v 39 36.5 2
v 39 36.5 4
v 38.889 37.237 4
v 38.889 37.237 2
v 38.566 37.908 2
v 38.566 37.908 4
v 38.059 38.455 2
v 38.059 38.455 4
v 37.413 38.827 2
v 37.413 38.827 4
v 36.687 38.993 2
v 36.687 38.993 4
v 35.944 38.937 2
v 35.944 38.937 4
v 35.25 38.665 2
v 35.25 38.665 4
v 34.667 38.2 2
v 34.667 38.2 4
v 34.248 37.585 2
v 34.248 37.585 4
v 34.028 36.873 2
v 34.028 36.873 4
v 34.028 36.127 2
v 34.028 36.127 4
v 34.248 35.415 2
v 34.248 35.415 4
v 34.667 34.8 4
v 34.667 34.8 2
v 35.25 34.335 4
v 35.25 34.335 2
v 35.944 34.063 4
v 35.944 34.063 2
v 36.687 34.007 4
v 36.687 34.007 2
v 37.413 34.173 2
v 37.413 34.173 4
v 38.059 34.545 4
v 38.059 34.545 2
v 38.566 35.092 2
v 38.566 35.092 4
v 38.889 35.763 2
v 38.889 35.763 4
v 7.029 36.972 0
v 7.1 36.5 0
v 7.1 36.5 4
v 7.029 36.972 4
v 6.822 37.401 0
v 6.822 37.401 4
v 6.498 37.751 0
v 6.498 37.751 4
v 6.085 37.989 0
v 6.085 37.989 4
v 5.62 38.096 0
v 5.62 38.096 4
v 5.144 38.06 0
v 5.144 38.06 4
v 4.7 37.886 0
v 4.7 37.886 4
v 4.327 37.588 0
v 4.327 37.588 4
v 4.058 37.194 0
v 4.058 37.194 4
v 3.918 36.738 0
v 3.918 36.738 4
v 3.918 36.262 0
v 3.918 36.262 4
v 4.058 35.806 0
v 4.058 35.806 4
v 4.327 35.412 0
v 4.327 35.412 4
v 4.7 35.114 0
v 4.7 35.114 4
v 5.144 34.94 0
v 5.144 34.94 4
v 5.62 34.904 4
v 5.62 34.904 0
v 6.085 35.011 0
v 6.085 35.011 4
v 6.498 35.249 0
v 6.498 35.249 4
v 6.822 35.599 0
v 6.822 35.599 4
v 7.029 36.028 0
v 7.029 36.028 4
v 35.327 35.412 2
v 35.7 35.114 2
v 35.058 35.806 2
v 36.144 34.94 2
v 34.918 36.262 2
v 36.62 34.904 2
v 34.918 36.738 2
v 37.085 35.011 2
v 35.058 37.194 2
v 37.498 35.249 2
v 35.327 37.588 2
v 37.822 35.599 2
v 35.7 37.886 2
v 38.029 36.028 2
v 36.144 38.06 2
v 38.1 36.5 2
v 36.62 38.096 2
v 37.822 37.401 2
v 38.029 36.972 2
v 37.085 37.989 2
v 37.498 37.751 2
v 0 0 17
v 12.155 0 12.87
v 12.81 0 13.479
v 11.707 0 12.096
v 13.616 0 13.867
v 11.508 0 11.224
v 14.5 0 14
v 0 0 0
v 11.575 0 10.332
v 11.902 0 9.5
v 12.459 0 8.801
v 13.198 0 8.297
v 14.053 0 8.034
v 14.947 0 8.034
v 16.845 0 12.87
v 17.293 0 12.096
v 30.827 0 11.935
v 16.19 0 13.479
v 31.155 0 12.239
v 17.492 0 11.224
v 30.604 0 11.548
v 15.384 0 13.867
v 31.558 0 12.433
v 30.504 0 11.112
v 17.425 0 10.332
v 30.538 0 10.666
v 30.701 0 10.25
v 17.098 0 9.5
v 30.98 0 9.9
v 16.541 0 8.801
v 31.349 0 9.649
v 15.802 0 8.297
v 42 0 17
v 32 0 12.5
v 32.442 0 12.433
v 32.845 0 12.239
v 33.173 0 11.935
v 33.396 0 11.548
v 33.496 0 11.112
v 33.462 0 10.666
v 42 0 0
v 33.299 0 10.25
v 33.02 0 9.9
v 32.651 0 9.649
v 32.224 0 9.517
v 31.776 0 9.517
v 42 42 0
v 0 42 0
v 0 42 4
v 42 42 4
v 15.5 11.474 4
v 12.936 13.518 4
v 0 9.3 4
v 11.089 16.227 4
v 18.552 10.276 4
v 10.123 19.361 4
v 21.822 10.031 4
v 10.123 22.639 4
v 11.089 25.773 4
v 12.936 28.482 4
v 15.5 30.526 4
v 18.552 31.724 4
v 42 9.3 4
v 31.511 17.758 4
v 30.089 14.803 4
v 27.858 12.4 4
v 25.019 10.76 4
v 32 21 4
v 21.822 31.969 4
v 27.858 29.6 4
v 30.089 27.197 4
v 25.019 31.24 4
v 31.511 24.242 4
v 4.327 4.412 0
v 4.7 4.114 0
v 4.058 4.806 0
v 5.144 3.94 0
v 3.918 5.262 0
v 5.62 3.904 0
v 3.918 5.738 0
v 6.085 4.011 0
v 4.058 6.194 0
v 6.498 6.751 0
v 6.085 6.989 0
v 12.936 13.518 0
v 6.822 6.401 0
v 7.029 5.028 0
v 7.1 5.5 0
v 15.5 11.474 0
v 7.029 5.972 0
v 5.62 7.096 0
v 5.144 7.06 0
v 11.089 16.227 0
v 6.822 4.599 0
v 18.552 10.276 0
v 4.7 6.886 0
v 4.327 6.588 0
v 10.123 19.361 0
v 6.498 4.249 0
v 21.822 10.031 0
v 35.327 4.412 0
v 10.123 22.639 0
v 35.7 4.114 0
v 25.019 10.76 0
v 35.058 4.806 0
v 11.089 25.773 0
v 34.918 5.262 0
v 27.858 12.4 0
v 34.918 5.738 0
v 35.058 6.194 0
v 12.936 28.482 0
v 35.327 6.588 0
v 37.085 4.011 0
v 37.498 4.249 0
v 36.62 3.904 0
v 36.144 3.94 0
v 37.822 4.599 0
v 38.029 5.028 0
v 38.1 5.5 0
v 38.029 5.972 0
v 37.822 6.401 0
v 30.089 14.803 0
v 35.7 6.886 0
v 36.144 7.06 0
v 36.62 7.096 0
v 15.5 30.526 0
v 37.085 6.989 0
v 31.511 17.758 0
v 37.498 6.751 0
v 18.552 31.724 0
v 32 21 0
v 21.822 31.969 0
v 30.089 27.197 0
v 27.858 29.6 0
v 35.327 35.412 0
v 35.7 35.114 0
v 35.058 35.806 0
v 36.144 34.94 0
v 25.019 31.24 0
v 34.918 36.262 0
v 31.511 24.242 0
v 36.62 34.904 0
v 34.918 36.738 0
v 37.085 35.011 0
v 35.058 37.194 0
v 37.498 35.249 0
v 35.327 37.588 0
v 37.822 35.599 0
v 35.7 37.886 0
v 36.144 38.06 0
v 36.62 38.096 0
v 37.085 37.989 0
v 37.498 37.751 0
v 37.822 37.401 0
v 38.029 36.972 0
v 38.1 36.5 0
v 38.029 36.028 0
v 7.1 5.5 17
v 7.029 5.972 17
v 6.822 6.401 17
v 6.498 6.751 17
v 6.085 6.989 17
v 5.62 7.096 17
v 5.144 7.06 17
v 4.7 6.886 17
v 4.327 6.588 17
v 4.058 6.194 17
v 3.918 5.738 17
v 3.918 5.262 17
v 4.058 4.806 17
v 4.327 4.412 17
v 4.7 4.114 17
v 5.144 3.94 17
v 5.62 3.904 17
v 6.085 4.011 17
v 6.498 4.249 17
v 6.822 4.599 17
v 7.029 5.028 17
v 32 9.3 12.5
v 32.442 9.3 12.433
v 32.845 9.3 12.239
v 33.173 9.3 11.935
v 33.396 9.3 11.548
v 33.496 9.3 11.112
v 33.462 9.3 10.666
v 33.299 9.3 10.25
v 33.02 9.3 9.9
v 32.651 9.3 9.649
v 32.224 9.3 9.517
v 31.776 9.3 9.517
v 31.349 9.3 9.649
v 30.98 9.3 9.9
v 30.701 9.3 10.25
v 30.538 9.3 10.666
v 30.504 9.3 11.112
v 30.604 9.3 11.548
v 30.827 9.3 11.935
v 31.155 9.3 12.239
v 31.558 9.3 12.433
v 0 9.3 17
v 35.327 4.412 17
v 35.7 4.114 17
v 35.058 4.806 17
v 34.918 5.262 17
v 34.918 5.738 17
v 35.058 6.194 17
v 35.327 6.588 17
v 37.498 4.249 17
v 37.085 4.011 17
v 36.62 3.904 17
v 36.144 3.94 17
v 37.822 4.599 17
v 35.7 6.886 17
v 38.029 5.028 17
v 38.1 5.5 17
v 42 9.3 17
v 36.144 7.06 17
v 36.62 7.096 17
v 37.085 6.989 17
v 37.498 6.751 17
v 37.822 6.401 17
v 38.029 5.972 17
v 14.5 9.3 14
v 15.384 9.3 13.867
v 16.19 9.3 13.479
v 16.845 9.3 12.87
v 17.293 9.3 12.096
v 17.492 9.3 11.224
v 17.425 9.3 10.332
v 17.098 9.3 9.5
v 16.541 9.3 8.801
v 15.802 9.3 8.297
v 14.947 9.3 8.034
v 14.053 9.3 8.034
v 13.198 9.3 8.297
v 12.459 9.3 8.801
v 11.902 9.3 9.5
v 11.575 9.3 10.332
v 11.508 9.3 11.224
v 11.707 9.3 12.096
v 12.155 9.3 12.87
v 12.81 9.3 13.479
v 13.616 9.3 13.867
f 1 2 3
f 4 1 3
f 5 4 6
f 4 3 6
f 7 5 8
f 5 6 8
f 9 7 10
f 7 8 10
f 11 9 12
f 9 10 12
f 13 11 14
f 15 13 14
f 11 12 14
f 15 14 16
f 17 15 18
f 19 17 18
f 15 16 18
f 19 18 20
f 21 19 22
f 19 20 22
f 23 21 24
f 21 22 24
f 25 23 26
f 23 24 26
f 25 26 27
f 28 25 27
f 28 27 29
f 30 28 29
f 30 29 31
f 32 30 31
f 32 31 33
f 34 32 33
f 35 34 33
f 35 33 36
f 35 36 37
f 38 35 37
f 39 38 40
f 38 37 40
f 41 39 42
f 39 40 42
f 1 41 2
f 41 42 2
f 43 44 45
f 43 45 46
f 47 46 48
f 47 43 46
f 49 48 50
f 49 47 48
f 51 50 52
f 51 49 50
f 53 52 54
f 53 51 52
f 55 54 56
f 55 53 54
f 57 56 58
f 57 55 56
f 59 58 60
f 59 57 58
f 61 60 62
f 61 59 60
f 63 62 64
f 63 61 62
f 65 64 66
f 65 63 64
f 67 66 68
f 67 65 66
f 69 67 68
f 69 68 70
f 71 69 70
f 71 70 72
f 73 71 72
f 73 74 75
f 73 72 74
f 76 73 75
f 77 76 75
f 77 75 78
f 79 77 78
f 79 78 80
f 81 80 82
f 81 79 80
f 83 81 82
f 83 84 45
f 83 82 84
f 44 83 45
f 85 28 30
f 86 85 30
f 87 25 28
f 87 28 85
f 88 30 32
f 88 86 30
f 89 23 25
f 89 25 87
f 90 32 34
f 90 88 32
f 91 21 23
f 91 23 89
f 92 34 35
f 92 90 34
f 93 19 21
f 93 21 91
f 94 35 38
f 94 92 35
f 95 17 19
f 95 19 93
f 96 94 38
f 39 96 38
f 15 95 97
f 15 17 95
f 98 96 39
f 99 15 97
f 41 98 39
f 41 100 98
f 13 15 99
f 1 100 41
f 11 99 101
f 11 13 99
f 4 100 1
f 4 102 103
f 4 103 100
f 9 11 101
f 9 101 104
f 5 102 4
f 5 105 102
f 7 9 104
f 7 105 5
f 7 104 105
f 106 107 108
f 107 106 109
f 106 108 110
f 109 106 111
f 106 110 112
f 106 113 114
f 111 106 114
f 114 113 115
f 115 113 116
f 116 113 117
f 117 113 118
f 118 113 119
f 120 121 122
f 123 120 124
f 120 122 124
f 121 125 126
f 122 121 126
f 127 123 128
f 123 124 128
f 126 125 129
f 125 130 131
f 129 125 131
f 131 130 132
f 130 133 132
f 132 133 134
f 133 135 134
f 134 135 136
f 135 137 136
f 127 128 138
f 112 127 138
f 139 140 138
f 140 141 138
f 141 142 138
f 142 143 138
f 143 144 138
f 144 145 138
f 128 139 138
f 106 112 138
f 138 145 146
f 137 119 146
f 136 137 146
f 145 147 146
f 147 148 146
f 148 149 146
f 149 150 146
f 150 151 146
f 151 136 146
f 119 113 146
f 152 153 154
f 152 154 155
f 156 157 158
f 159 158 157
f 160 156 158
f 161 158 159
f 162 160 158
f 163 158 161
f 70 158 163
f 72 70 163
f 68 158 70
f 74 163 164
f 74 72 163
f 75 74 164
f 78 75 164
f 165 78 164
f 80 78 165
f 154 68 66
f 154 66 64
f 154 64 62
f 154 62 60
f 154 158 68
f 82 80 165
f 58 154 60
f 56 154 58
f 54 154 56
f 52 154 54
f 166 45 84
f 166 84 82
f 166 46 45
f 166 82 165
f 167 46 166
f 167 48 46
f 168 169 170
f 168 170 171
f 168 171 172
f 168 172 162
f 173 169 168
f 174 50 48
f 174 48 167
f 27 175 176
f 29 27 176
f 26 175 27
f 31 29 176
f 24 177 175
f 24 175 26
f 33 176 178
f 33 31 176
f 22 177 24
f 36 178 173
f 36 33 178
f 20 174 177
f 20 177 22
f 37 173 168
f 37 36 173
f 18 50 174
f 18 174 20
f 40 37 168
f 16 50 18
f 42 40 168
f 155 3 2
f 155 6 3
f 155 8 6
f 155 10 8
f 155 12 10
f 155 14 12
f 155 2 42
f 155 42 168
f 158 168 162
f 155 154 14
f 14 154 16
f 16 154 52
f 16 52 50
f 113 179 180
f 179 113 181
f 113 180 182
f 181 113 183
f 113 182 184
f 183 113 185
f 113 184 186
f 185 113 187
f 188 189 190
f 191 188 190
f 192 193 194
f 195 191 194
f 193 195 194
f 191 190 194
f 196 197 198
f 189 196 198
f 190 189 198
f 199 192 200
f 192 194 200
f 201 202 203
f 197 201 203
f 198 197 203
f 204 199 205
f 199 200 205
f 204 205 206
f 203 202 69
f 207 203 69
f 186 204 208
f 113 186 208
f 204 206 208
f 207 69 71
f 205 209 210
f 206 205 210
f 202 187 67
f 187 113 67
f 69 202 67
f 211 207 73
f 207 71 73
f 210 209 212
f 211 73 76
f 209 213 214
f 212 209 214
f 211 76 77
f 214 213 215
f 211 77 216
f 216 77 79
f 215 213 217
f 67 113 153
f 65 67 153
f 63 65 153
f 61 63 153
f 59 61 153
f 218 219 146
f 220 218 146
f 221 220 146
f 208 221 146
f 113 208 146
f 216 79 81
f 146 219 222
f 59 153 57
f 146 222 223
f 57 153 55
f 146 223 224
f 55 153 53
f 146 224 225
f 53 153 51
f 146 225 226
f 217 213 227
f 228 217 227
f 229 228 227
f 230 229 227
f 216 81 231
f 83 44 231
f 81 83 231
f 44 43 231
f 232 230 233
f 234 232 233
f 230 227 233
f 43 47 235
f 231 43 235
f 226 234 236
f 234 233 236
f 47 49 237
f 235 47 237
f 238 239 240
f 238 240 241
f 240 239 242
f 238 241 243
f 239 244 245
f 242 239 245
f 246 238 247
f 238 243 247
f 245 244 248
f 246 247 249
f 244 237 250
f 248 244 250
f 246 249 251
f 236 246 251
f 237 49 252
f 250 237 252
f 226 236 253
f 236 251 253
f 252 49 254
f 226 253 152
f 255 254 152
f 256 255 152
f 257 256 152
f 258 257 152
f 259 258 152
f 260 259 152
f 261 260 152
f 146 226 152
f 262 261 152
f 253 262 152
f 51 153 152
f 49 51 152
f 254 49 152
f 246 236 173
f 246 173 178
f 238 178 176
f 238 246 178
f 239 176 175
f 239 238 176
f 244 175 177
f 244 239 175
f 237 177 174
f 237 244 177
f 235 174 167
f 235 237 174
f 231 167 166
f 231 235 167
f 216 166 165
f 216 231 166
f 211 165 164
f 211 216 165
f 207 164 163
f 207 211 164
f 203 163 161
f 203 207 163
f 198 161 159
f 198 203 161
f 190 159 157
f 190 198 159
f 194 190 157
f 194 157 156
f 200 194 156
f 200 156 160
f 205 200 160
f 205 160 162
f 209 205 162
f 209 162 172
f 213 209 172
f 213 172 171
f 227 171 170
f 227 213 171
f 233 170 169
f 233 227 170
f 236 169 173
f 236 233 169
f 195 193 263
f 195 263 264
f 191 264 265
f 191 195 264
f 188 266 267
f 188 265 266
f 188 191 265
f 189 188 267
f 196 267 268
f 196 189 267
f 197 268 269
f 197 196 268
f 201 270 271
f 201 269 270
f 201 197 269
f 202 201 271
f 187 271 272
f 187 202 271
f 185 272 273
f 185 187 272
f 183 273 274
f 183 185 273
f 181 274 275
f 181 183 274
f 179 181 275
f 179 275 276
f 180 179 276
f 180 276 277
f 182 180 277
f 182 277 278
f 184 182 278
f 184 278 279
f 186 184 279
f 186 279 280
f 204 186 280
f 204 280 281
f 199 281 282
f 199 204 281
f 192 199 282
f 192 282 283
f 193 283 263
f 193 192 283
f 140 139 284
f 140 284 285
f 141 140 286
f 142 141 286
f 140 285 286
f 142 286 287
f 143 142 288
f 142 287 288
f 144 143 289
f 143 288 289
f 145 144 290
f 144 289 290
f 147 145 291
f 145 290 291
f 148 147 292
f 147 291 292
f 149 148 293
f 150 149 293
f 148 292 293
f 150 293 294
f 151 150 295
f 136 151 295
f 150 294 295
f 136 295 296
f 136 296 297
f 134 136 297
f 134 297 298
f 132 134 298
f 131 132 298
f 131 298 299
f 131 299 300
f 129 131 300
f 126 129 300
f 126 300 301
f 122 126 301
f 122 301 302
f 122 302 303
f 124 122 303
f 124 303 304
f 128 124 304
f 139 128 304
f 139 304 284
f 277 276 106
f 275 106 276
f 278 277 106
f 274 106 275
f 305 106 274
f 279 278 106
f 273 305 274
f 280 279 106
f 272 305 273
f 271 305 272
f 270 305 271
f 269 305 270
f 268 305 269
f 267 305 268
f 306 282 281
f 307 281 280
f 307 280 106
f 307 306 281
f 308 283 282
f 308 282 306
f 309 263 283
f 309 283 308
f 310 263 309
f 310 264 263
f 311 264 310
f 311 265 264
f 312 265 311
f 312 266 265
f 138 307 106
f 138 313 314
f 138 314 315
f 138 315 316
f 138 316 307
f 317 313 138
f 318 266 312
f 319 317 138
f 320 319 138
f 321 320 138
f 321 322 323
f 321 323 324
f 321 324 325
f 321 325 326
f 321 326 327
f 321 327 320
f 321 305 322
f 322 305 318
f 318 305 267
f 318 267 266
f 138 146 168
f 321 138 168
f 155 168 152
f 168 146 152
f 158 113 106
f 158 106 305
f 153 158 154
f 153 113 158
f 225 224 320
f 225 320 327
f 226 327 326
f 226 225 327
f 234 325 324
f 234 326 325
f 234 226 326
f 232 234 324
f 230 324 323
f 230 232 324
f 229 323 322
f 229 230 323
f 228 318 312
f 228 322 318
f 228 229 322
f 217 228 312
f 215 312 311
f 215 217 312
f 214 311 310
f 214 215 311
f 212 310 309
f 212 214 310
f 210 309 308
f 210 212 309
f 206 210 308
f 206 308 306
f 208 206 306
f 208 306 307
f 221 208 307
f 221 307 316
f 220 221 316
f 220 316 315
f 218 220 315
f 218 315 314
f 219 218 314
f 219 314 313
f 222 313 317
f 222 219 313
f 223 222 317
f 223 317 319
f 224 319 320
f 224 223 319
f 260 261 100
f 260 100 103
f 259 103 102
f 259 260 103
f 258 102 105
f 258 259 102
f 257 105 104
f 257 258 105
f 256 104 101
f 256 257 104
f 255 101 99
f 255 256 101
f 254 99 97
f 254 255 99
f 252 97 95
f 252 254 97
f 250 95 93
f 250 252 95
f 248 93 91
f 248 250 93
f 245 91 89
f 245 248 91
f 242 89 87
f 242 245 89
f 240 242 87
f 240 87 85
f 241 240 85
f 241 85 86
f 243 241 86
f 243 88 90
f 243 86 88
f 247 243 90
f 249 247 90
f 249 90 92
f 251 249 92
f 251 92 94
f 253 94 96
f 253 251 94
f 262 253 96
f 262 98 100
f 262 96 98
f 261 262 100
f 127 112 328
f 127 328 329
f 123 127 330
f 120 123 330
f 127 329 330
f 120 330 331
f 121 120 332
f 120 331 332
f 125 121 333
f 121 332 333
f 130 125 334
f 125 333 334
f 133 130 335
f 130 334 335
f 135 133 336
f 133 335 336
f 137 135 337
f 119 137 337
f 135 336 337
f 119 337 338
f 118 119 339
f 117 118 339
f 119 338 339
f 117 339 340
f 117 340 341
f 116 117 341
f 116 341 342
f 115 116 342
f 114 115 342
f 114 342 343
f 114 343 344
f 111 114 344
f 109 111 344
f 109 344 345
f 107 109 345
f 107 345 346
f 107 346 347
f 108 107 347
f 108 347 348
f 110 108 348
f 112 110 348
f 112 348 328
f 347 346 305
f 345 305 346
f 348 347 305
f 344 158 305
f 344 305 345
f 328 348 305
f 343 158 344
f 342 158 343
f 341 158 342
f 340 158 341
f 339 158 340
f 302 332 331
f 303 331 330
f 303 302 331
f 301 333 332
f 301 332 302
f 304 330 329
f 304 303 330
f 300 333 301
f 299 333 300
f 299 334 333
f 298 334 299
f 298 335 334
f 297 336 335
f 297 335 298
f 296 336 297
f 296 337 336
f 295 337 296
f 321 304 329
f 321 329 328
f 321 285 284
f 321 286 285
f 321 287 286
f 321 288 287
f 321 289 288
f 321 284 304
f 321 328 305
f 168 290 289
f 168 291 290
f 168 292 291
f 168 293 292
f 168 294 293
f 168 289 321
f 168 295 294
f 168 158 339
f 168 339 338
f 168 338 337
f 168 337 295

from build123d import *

# Parameters (mm, degrees)
SKETCH1_W               = 42
SKETCH1_H               = 42
BOSS_EXTRUDE1_DEPTH     = 17
SKETCH3_W               = 42
SKETCH3_H               = 13
CUT_EXTRUDE1_DEPTH      = 32.7
CUT_EXTRUDE2_DEPTH      = 61.802960454
CUT_EXTRUDE2_DEPTH_BACK = 61.802960454
SKETCH4_R               = 1.6
SKETCH4_R_2             = 11
SKETCH5_R               = 2.5
CUT_EXTRUDE3_DEPTH      = 2
SKETCH6_R               = 1.5
SKETCH6_R_2             = 3
CUT_EXTRUDE4_DEPTH      = 56.877455203


with BuildPart() as part:
    # Sketch1 → Boss-Extrude1 (new body)
    with BuildSketch(Plane.XY):
        with Locations((21, 21)):
            Rectangle(SKETCH1_W, SKETCH1_H)
    extrude(amount=BOSS_EXTRUDE1_DEPTH)

    # Sketch3 → Cut-Extrude1 (cut)
    with BuildSketch(Plane(origin=(0, 42, 0), x_dir=(1, 0, 0), z_dir=(0, 1, 0))):
        with Locations((21, -10.5)):
            Rectangle(SKETCH3_W, SKETCH3_H)
    extrude(amount=-CUT_EXTRUDE1_DEPTH, mode=Mode.SUBTRACT)

    # Sketch4 → Cut-Extrude2 (cut, two sides: drawn at the far end of the back side and taken through both)
    with BuildSketch(Plane.XY.offset(4).offset(-CUT_EXTRUDE2_DEPTH_BACK)):
        with Locations((36.5, 36.5)):
            Circle(SKETCH4_R)
        with Locations((5.5, 36.5)):
            Circle(SKETCH4_R)
        with Locations((21, 21)):
            Circle(SKETCH4_R_2)
        with Locations((5.5, 5.5)):
            Circle(SKETCH4_R)
        with Locations((36.5, 5.5)):
            Circle(SKETCH4_R)
    extrude(amount=CUT_EXTRUDE2_DEPTH + CUT_EXTRUDE2_DEPTH_BACK, mode=Mode.SUBTRACT)

    # Sketch5 → Cut-Extrude3 (cut)
    with BuildSketch(Plane.XY.offset(4)):
        with Locations((36.5, 36.5)):
            Circle(SKETCH5_R)
    extrude(amount=-CUT_EXTRUDE3_DEPTH, mode=Mode.SUBTRACT)

    # Sketch6 → Cut-Extrude4 (cut, through all)
    with BuildSketch(Plane(origin=(0, 9.3, 0), x_dir=(1, 0, 0), z_dir=(0, 1, 0))):
        with Locations(Location((32, -11, 0), (0, 0, 270))):
            Circle(SKETCH6_R)
        with Locations(Location((14.5, -11, 0), (0, 0, 270))):
            Circle(SKETCH6_R_2)
    extrude(amount=-CUT_EXTRUDE4_DEPTH, mode=Mode.SUBTRACT)


solid = part.part
